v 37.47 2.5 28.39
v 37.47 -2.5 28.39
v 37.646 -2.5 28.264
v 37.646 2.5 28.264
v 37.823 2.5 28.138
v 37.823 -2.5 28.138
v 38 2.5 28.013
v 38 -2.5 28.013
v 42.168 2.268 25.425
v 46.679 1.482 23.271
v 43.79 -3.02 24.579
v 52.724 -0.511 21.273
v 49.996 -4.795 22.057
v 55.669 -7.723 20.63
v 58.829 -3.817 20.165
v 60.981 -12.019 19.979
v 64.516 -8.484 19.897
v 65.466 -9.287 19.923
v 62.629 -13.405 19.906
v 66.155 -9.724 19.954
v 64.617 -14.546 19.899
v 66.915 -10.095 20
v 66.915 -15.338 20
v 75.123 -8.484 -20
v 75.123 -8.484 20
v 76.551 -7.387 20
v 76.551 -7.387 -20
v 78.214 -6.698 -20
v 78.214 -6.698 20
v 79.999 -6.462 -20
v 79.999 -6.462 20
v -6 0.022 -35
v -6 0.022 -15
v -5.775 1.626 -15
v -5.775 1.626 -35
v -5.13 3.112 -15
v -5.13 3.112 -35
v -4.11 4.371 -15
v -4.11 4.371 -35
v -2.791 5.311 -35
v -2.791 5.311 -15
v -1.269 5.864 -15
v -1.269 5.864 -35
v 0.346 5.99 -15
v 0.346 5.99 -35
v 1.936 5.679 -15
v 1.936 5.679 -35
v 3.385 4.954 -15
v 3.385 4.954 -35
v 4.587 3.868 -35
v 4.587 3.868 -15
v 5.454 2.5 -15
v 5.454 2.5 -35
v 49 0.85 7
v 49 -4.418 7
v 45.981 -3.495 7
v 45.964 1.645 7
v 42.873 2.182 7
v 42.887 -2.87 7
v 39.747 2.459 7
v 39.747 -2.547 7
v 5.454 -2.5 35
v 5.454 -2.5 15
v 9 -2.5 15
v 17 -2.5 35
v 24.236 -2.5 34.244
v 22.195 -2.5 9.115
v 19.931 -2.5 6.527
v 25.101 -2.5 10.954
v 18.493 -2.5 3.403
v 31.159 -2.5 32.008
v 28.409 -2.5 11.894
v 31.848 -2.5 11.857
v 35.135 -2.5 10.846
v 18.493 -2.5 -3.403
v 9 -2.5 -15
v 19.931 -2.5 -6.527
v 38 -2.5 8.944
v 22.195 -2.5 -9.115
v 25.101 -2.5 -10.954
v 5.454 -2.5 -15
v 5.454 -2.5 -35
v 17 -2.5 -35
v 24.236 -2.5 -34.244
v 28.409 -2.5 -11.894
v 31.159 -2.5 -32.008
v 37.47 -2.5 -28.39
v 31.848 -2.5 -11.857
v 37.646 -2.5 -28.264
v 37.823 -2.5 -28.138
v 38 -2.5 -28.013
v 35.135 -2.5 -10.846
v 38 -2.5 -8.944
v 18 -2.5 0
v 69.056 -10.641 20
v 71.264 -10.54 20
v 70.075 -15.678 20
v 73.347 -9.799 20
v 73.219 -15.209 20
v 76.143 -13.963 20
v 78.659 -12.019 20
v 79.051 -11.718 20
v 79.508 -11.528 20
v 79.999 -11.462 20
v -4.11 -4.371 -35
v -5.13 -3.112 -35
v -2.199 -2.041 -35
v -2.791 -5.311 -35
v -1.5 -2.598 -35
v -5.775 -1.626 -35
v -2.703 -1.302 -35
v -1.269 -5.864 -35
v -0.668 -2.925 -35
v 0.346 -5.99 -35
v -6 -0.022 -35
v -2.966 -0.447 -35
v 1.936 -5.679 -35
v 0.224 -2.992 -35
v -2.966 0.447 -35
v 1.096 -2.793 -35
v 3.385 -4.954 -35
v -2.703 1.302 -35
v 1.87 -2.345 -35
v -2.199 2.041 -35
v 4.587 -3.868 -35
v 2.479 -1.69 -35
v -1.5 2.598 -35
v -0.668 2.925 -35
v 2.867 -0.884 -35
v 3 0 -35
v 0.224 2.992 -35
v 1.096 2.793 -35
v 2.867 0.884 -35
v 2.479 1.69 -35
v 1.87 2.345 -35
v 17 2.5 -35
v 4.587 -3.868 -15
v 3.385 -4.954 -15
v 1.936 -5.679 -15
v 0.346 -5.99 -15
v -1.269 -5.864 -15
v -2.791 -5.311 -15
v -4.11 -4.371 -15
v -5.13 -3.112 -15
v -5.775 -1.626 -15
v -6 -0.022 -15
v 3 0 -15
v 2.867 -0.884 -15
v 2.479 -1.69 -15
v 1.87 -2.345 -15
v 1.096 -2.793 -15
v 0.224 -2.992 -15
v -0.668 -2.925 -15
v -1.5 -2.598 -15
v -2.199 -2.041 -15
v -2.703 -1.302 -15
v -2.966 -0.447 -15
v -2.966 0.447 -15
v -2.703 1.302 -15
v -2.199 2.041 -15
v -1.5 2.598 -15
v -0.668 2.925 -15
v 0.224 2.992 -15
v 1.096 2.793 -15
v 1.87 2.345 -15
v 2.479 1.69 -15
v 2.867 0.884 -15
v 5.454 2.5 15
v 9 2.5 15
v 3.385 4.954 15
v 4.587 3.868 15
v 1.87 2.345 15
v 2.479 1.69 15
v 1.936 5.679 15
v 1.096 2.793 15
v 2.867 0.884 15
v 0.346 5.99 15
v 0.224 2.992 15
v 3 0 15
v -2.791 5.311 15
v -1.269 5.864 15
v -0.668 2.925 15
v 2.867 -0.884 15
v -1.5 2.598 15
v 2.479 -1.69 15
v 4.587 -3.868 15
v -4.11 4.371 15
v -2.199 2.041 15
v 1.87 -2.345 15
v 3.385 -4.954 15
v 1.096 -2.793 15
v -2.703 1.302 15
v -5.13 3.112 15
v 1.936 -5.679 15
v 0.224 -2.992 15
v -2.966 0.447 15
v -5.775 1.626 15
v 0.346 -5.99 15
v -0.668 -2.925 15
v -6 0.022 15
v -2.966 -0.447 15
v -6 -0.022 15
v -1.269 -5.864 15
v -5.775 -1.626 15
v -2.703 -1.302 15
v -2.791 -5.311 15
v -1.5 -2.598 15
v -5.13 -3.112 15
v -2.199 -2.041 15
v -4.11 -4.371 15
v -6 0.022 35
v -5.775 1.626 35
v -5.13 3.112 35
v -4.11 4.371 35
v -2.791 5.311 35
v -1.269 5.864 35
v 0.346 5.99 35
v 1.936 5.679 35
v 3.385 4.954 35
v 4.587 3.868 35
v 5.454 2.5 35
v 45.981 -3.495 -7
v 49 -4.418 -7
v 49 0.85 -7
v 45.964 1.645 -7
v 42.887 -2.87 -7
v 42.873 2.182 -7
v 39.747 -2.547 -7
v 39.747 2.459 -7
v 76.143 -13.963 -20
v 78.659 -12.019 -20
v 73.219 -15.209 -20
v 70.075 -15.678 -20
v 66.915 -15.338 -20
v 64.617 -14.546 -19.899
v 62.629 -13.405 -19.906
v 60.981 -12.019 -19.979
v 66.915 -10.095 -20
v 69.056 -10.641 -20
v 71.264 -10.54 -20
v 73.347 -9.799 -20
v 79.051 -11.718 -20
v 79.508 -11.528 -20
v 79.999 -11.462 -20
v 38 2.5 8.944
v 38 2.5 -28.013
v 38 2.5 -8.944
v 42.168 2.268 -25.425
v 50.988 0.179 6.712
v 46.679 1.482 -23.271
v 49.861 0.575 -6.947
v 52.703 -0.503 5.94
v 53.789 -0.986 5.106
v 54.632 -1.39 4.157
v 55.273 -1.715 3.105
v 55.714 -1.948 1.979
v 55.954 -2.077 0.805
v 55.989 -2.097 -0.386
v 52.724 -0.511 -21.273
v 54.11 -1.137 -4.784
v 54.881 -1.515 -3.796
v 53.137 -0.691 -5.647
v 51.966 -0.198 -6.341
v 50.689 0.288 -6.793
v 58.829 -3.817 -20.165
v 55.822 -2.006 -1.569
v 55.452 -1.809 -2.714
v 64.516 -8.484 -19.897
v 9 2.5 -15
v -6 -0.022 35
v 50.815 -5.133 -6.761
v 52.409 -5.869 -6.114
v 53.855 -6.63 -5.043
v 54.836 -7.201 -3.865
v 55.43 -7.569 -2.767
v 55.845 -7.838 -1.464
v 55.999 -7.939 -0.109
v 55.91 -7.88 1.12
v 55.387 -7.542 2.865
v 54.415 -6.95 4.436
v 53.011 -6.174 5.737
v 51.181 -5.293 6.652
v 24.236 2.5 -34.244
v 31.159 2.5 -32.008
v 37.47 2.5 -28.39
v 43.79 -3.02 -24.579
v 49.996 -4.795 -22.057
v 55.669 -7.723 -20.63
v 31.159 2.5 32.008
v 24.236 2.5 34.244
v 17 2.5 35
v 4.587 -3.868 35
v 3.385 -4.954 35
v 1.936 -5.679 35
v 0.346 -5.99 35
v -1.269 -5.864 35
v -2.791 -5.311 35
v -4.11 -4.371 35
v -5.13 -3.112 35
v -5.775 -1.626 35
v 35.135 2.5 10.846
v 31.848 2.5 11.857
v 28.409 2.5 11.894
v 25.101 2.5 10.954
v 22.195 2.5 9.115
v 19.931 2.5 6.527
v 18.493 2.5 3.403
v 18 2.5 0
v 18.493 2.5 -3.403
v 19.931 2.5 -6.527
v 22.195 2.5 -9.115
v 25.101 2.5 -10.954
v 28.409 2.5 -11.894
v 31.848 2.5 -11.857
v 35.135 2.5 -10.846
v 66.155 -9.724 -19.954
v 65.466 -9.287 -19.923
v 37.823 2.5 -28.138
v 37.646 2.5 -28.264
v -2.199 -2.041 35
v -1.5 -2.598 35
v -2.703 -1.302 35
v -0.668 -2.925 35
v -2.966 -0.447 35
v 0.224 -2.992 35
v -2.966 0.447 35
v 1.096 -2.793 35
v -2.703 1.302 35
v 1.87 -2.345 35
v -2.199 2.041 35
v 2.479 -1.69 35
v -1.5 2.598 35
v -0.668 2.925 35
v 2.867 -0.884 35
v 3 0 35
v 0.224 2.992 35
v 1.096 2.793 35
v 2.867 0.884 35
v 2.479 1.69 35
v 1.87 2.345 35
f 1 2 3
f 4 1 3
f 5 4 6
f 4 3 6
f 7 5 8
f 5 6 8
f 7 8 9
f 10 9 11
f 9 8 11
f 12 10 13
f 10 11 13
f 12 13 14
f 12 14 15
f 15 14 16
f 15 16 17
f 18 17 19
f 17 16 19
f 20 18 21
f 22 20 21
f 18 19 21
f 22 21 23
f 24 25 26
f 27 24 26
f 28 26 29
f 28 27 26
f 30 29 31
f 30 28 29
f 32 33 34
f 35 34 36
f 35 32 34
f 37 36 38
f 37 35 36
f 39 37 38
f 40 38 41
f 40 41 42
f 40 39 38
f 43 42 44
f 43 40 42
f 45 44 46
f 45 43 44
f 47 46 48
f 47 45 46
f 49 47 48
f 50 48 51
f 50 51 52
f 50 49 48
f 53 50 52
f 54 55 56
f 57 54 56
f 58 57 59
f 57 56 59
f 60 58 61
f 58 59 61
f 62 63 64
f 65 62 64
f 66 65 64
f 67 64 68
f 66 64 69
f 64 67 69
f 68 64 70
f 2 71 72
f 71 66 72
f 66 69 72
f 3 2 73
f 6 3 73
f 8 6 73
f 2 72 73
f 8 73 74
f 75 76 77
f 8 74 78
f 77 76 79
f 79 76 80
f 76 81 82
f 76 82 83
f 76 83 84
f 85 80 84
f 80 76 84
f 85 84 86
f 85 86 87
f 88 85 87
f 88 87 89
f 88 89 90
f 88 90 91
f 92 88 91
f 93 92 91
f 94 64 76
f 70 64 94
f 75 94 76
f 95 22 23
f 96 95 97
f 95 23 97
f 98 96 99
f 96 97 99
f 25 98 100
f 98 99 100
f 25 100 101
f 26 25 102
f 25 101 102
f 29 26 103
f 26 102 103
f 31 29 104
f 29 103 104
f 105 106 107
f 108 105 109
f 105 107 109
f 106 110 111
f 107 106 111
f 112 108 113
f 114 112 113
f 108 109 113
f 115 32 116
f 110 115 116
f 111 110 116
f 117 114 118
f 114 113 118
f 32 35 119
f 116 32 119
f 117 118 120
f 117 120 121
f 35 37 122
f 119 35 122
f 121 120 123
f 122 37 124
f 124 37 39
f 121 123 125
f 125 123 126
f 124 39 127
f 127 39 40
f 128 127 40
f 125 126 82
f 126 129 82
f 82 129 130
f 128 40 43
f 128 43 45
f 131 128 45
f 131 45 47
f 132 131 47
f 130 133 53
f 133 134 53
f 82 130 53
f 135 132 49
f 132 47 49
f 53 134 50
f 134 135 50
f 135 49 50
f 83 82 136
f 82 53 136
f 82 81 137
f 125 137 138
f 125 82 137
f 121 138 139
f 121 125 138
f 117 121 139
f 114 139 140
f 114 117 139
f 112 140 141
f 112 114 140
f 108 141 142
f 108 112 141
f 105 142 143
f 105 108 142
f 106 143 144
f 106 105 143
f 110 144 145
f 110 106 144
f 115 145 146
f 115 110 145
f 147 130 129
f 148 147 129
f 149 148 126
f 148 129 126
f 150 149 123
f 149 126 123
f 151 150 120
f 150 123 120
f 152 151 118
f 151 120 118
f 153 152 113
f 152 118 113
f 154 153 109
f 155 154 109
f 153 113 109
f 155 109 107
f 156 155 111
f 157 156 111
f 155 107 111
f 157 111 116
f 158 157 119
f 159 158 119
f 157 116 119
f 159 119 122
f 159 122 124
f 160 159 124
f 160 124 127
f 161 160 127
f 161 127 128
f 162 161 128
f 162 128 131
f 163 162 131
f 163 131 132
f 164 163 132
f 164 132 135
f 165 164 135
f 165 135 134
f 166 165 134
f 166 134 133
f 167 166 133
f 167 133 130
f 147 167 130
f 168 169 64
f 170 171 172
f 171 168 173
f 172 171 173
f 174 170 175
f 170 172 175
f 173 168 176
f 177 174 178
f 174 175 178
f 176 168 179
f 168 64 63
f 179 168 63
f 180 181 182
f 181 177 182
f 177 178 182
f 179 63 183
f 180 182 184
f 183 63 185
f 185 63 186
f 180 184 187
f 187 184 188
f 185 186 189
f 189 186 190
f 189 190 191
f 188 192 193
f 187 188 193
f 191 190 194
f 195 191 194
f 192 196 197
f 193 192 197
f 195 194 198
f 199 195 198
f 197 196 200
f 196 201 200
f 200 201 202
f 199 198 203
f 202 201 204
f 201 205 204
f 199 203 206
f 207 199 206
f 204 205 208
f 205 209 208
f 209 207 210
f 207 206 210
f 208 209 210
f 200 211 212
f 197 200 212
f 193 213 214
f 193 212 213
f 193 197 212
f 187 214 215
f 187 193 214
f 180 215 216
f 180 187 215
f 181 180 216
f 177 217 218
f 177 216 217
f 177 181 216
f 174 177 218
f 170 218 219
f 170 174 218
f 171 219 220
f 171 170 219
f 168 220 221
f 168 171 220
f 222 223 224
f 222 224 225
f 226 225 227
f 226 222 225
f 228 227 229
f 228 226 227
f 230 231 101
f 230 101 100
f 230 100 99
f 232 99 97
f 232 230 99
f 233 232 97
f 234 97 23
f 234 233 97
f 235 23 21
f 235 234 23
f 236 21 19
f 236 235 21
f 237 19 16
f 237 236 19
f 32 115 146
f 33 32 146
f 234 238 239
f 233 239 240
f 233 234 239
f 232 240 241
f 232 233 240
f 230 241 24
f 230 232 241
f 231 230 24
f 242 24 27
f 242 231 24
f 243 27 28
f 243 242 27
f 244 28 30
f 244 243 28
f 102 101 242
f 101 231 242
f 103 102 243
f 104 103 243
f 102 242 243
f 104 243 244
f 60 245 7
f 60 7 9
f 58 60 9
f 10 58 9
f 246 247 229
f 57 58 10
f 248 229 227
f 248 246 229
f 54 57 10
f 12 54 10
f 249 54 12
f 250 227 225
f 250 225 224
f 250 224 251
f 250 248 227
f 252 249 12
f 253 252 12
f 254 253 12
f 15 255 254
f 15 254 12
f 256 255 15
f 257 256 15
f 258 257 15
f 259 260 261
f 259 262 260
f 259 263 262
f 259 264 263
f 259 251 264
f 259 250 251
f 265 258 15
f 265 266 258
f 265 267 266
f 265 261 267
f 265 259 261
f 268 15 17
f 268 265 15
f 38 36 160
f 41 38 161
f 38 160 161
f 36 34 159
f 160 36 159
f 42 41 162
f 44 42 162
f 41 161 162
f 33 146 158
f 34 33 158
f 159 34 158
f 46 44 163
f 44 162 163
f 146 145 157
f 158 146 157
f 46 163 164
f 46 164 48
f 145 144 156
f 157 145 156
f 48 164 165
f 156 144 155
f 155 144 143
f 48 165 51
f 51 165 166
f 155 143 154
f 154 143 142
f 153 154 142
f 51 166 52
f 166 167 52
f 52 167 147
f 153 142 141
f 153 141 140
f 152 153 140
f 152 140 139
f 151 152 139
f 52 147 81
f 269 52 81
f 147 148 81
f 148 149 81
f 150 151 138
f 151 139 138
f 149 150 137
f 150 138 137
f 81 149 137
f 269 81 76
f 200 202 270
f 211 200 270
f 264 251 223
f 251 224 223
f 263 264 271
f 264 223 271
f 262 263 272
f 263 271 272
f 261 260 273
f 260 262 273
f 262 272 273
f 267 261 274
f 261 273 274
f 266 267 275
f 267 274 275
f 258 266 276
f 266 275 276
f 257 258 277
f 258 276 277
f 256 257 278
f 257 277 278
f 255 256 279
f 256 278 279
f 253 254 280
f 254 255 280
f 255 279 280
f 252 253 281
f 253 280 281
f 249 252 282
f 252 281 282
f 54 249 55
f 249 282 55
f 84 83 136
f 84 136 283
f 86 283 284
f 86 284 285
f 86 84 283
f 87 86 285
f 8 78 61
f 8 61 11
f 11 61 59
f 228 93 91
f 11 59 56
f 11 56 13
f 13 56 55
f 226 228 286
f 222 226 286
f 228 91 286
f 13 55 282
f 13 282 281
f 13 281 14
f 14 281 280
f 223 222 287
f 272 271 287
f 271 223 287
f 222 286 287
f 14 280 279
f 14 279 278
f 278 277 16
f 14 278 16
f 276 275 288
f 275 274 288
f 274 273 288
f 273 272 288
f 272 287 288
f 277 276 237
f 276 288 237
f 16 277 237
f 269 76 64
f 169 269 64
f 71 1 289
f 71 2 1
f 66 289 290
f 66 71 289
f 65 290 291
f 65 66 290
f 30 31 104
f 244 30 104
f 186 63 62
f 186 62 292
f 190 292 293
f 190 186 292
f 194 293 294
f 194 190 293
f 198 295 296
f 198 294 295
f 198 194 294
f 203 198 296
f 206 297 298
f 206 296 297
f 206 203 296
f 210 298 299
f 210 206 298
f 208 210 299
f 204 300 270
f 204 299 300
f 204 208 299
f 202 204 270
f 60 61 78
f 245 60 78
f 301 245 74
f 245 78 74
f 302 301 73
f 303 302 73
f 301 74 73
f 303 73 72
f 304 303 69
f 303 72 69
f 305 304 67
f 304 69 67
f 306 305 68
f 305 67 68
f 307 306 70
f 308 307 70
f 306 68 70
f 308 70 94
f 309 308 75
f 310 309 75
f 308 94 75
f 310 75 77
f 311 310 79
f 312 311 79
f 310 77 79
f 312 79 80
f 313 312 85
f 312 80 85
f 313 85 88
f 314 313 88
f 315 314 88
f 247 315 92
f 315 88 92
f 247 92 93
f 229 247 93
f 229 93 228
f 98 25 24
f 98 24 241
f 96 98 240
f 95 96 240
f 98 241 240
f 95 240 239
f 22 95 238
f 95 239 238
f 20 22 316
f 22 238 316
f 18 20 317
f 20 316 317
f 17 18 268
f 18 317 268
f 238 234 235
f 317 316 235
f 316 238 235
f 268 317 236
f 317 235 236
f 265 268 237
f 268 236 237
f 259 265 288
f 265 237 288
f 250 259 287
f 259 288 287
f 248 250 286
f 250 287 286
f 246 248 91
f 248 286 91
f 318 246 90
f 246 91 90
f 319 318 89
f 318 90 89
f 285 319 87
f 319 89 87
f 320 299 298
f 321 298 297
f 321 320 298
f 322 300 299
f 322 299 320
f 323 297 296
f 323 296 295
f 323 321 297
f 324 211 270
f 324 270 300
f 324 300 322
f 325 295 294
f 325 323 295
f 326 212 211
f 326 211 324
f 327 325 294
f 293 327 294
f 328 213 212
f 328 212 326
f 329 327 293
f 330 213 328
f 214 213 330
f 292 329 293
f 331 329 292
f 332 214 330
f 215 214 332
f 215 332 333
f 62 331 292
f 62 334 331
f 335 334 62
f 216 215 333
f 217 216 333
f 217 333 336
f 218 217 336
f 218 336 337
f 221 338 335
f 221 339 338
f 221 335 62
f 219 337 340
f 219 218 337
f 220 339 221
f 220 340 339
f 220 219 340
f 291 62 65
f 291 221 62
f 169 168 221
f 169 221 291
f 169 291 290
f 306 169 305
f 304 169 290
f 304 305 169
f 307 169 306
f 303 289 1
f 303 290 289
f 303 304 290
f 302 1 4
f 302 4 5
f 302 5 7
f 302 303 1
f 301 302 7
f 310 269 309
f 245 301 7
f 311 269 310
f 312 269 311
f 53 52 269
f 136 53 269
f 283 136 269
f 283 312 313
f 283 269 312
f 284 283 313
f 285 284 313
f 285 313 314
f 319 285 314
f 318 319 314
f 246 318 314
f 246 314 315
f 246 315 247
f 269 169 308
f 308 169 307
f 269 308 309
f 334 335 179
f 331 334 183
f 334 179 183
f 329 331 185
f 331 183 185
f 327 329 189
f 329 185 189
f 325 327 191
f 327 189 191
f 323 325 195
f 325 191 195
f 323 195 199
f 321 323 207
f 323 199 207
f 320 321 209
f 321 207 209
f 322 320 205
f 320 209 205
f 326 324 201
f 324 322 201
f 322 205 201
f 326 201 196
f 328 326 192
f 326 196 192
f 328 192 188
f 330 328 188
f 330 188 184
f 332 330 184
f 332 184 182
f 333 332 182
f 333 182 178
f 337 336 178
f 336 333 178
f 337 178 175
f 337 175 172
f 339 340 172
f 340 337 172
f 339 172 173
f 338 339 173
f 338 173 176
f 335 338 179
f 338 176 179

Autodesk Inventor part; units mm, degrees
ref_plane "YZ Plane" through (0, 0, 0) normal (1, 0, 0) x (0, 1, 0)
ref_plane "XZ Plane" through (0, 0, 0) normal (0, 1, 0) x (-1, 0, 0)
ref_plane "XY Plane" through (0, 0, 0) normal (0, 0, 1) x (1, 0, 0)
sketch "Sketch1" plane through (0, 0, 0) normal (0, 0, 1) x (1, 0, 0)
  line L0 (0, 0) -> (38, 0) construction
  arc A0 (62.7487, -10.2513) -> (38, 0) centre (38, -35) ccw construction
  arc A1 (62.7487, -10.2513) -> (76.8909, -10.2513) centre (69.8198, -3.1802) ccw construction
  arc A2 (80, -8.9625) -> (76.8909, -10.2513) centre (80.0021, -13.3625) ccw construction
  line L1 (38, 0) -> (38, -35) construction
  line L2 (38, -35) -> (69.8198, -3.1802) construction
  line L3 (69.8198, -3.1802) -> (80.0021, -13.3625) construction
  line L4 (5.4544, 2.5) -> (38, 2.5)
  arc A3 (64.5165, -8.4835) -> (38, 2.5) centre (38, -35) ccw
  arc A4 (64.5165, -8.4835) -> (75.1231, -8.4835) centre (69.8198, -3.1802) ccw
  arc A5 (79.9988, -6.4625) -> (75.1231, -8.4835) centre (80.0021, -13.3625) ccw
  arc A6 (60.981, -12.019) -> (38, -2.5) centre (38, -35) ccw
  arc A7 (60.981, -12.019) -> (78.6586, -12.019) centre (69.8198, -3.1802) ccw
  arc A8 (79.9988, -11.4625) -> (78.6586, -12.019) centre (80.0021, -13.3625) ccw
  line L5 (79.9988, -6.4625) -> (79.9988, -11.4625)
  arc A9 (5.4544, 2.5) -> (5.4544, -2.5) centre (0, 0) ccw
  circle A10 centre (0, 0) radius 3
  line L6 (5.4544, -2.5) -> (38, -2.5)
  dimension "d0" = 38
  dimension "d1" = 35
  dimension "d2" = 10
  dimension "d3" = 4.4
  dimension "d4" = 45
  dimension "d5" = 80
  dimension "d6" = 2.5
  dimension "d8" = 12
  dimension "d9" = 6
extrude "Extrusion1" add sketch "Sketch1" along normal mid plane 70
fillet "Fillet1" radius 3 2 edges at (79.9988, -8.9625, 35) (79.9988, -8.9625, -35)
sketch "Sketch2" plane through (0, 0, 0) normal (0, 1, 0) x (-1, 0, 0)
  line L0 (6, -35) -> (6, 35) projected
  line L1 (-79.9988, -32) -> (-79.9988, 32) projected
  line L2 (23.2007, 0) -> (-97.2041, 0) construction
  line L3 (6, 35) -> (-5.4544, 35) construction
  line L4 (6, 35) -> (-17, 35)
  arc A0 (-17, 35) -> (-37.4698, 28.3899) centre (-17, 0) ccw
  arc A1 (-66.9147, 20) -> (-37.4698, 28.3899) centre (-63.7881, 64.8913) ccw
  line L5 (-66.9147, 20) -> (-79.9988, 20)
  line L6 (6, -35) -> (-17, -35)
  arc A2 (-37.4698, -28.3899) -> (-17, -35) centre (-17, 0) ccw
  arc A3 (-37.4698, -28.3899) -> (-66.9147, -20) centre (-63.7881, -64.8913) ccw
  line L7 (-66.9147, -20) -> (-79.9988, -20)
  line L8 (-79.9988, -20) -> (-79.9988, 20) construction
  line L9 (-79.9988, -20) -> (-79.9988, 20)
  line L10 (6, -35) -> (6, -15)
  line L11 (6, -15) -> (-9, -15)
  line L12 (-9, -15) -> (-9, 15)
  line L13 (-9, 15) -> (6, 15)
  line L14 (6, 15) -> (6, 35)
  arc A4 (-39.7468, -7) -> (-39.7468, 7) centre (-30, 0) ccw
  arc A5 (-49, 7) -> (-49, -7) centre (-49, 0) ccw
  line L15 (-49, -7) -> (-39.7468, -7)
  line L16 (-49, 7) -> (-39.7468, 7)
  point P0 (0, 0)
  point P1 (6, 0)
  point P2 (-9, 0)
  dimension "d13" = 17
  dimension "d14" = 35
  dimension "d15" = 40
  dimension "d16" = 45
  dimension "d17" = 30
  dimension "d18" = 15
  dimension "d19" = 12
  dimension "d20" = 7
  dimension "d21" = 30
  dimension "d22" = 19
extrude "Extrusion2" cut sketch "Sketch2" along normal mid plane 70 contours L6 A2 A3 L7 L1 L5 A1 A0 L4 L0 L13 L12 L11 keep common part
properties part number "Part017. Tilting clamo" material "Steel, Carbon"
